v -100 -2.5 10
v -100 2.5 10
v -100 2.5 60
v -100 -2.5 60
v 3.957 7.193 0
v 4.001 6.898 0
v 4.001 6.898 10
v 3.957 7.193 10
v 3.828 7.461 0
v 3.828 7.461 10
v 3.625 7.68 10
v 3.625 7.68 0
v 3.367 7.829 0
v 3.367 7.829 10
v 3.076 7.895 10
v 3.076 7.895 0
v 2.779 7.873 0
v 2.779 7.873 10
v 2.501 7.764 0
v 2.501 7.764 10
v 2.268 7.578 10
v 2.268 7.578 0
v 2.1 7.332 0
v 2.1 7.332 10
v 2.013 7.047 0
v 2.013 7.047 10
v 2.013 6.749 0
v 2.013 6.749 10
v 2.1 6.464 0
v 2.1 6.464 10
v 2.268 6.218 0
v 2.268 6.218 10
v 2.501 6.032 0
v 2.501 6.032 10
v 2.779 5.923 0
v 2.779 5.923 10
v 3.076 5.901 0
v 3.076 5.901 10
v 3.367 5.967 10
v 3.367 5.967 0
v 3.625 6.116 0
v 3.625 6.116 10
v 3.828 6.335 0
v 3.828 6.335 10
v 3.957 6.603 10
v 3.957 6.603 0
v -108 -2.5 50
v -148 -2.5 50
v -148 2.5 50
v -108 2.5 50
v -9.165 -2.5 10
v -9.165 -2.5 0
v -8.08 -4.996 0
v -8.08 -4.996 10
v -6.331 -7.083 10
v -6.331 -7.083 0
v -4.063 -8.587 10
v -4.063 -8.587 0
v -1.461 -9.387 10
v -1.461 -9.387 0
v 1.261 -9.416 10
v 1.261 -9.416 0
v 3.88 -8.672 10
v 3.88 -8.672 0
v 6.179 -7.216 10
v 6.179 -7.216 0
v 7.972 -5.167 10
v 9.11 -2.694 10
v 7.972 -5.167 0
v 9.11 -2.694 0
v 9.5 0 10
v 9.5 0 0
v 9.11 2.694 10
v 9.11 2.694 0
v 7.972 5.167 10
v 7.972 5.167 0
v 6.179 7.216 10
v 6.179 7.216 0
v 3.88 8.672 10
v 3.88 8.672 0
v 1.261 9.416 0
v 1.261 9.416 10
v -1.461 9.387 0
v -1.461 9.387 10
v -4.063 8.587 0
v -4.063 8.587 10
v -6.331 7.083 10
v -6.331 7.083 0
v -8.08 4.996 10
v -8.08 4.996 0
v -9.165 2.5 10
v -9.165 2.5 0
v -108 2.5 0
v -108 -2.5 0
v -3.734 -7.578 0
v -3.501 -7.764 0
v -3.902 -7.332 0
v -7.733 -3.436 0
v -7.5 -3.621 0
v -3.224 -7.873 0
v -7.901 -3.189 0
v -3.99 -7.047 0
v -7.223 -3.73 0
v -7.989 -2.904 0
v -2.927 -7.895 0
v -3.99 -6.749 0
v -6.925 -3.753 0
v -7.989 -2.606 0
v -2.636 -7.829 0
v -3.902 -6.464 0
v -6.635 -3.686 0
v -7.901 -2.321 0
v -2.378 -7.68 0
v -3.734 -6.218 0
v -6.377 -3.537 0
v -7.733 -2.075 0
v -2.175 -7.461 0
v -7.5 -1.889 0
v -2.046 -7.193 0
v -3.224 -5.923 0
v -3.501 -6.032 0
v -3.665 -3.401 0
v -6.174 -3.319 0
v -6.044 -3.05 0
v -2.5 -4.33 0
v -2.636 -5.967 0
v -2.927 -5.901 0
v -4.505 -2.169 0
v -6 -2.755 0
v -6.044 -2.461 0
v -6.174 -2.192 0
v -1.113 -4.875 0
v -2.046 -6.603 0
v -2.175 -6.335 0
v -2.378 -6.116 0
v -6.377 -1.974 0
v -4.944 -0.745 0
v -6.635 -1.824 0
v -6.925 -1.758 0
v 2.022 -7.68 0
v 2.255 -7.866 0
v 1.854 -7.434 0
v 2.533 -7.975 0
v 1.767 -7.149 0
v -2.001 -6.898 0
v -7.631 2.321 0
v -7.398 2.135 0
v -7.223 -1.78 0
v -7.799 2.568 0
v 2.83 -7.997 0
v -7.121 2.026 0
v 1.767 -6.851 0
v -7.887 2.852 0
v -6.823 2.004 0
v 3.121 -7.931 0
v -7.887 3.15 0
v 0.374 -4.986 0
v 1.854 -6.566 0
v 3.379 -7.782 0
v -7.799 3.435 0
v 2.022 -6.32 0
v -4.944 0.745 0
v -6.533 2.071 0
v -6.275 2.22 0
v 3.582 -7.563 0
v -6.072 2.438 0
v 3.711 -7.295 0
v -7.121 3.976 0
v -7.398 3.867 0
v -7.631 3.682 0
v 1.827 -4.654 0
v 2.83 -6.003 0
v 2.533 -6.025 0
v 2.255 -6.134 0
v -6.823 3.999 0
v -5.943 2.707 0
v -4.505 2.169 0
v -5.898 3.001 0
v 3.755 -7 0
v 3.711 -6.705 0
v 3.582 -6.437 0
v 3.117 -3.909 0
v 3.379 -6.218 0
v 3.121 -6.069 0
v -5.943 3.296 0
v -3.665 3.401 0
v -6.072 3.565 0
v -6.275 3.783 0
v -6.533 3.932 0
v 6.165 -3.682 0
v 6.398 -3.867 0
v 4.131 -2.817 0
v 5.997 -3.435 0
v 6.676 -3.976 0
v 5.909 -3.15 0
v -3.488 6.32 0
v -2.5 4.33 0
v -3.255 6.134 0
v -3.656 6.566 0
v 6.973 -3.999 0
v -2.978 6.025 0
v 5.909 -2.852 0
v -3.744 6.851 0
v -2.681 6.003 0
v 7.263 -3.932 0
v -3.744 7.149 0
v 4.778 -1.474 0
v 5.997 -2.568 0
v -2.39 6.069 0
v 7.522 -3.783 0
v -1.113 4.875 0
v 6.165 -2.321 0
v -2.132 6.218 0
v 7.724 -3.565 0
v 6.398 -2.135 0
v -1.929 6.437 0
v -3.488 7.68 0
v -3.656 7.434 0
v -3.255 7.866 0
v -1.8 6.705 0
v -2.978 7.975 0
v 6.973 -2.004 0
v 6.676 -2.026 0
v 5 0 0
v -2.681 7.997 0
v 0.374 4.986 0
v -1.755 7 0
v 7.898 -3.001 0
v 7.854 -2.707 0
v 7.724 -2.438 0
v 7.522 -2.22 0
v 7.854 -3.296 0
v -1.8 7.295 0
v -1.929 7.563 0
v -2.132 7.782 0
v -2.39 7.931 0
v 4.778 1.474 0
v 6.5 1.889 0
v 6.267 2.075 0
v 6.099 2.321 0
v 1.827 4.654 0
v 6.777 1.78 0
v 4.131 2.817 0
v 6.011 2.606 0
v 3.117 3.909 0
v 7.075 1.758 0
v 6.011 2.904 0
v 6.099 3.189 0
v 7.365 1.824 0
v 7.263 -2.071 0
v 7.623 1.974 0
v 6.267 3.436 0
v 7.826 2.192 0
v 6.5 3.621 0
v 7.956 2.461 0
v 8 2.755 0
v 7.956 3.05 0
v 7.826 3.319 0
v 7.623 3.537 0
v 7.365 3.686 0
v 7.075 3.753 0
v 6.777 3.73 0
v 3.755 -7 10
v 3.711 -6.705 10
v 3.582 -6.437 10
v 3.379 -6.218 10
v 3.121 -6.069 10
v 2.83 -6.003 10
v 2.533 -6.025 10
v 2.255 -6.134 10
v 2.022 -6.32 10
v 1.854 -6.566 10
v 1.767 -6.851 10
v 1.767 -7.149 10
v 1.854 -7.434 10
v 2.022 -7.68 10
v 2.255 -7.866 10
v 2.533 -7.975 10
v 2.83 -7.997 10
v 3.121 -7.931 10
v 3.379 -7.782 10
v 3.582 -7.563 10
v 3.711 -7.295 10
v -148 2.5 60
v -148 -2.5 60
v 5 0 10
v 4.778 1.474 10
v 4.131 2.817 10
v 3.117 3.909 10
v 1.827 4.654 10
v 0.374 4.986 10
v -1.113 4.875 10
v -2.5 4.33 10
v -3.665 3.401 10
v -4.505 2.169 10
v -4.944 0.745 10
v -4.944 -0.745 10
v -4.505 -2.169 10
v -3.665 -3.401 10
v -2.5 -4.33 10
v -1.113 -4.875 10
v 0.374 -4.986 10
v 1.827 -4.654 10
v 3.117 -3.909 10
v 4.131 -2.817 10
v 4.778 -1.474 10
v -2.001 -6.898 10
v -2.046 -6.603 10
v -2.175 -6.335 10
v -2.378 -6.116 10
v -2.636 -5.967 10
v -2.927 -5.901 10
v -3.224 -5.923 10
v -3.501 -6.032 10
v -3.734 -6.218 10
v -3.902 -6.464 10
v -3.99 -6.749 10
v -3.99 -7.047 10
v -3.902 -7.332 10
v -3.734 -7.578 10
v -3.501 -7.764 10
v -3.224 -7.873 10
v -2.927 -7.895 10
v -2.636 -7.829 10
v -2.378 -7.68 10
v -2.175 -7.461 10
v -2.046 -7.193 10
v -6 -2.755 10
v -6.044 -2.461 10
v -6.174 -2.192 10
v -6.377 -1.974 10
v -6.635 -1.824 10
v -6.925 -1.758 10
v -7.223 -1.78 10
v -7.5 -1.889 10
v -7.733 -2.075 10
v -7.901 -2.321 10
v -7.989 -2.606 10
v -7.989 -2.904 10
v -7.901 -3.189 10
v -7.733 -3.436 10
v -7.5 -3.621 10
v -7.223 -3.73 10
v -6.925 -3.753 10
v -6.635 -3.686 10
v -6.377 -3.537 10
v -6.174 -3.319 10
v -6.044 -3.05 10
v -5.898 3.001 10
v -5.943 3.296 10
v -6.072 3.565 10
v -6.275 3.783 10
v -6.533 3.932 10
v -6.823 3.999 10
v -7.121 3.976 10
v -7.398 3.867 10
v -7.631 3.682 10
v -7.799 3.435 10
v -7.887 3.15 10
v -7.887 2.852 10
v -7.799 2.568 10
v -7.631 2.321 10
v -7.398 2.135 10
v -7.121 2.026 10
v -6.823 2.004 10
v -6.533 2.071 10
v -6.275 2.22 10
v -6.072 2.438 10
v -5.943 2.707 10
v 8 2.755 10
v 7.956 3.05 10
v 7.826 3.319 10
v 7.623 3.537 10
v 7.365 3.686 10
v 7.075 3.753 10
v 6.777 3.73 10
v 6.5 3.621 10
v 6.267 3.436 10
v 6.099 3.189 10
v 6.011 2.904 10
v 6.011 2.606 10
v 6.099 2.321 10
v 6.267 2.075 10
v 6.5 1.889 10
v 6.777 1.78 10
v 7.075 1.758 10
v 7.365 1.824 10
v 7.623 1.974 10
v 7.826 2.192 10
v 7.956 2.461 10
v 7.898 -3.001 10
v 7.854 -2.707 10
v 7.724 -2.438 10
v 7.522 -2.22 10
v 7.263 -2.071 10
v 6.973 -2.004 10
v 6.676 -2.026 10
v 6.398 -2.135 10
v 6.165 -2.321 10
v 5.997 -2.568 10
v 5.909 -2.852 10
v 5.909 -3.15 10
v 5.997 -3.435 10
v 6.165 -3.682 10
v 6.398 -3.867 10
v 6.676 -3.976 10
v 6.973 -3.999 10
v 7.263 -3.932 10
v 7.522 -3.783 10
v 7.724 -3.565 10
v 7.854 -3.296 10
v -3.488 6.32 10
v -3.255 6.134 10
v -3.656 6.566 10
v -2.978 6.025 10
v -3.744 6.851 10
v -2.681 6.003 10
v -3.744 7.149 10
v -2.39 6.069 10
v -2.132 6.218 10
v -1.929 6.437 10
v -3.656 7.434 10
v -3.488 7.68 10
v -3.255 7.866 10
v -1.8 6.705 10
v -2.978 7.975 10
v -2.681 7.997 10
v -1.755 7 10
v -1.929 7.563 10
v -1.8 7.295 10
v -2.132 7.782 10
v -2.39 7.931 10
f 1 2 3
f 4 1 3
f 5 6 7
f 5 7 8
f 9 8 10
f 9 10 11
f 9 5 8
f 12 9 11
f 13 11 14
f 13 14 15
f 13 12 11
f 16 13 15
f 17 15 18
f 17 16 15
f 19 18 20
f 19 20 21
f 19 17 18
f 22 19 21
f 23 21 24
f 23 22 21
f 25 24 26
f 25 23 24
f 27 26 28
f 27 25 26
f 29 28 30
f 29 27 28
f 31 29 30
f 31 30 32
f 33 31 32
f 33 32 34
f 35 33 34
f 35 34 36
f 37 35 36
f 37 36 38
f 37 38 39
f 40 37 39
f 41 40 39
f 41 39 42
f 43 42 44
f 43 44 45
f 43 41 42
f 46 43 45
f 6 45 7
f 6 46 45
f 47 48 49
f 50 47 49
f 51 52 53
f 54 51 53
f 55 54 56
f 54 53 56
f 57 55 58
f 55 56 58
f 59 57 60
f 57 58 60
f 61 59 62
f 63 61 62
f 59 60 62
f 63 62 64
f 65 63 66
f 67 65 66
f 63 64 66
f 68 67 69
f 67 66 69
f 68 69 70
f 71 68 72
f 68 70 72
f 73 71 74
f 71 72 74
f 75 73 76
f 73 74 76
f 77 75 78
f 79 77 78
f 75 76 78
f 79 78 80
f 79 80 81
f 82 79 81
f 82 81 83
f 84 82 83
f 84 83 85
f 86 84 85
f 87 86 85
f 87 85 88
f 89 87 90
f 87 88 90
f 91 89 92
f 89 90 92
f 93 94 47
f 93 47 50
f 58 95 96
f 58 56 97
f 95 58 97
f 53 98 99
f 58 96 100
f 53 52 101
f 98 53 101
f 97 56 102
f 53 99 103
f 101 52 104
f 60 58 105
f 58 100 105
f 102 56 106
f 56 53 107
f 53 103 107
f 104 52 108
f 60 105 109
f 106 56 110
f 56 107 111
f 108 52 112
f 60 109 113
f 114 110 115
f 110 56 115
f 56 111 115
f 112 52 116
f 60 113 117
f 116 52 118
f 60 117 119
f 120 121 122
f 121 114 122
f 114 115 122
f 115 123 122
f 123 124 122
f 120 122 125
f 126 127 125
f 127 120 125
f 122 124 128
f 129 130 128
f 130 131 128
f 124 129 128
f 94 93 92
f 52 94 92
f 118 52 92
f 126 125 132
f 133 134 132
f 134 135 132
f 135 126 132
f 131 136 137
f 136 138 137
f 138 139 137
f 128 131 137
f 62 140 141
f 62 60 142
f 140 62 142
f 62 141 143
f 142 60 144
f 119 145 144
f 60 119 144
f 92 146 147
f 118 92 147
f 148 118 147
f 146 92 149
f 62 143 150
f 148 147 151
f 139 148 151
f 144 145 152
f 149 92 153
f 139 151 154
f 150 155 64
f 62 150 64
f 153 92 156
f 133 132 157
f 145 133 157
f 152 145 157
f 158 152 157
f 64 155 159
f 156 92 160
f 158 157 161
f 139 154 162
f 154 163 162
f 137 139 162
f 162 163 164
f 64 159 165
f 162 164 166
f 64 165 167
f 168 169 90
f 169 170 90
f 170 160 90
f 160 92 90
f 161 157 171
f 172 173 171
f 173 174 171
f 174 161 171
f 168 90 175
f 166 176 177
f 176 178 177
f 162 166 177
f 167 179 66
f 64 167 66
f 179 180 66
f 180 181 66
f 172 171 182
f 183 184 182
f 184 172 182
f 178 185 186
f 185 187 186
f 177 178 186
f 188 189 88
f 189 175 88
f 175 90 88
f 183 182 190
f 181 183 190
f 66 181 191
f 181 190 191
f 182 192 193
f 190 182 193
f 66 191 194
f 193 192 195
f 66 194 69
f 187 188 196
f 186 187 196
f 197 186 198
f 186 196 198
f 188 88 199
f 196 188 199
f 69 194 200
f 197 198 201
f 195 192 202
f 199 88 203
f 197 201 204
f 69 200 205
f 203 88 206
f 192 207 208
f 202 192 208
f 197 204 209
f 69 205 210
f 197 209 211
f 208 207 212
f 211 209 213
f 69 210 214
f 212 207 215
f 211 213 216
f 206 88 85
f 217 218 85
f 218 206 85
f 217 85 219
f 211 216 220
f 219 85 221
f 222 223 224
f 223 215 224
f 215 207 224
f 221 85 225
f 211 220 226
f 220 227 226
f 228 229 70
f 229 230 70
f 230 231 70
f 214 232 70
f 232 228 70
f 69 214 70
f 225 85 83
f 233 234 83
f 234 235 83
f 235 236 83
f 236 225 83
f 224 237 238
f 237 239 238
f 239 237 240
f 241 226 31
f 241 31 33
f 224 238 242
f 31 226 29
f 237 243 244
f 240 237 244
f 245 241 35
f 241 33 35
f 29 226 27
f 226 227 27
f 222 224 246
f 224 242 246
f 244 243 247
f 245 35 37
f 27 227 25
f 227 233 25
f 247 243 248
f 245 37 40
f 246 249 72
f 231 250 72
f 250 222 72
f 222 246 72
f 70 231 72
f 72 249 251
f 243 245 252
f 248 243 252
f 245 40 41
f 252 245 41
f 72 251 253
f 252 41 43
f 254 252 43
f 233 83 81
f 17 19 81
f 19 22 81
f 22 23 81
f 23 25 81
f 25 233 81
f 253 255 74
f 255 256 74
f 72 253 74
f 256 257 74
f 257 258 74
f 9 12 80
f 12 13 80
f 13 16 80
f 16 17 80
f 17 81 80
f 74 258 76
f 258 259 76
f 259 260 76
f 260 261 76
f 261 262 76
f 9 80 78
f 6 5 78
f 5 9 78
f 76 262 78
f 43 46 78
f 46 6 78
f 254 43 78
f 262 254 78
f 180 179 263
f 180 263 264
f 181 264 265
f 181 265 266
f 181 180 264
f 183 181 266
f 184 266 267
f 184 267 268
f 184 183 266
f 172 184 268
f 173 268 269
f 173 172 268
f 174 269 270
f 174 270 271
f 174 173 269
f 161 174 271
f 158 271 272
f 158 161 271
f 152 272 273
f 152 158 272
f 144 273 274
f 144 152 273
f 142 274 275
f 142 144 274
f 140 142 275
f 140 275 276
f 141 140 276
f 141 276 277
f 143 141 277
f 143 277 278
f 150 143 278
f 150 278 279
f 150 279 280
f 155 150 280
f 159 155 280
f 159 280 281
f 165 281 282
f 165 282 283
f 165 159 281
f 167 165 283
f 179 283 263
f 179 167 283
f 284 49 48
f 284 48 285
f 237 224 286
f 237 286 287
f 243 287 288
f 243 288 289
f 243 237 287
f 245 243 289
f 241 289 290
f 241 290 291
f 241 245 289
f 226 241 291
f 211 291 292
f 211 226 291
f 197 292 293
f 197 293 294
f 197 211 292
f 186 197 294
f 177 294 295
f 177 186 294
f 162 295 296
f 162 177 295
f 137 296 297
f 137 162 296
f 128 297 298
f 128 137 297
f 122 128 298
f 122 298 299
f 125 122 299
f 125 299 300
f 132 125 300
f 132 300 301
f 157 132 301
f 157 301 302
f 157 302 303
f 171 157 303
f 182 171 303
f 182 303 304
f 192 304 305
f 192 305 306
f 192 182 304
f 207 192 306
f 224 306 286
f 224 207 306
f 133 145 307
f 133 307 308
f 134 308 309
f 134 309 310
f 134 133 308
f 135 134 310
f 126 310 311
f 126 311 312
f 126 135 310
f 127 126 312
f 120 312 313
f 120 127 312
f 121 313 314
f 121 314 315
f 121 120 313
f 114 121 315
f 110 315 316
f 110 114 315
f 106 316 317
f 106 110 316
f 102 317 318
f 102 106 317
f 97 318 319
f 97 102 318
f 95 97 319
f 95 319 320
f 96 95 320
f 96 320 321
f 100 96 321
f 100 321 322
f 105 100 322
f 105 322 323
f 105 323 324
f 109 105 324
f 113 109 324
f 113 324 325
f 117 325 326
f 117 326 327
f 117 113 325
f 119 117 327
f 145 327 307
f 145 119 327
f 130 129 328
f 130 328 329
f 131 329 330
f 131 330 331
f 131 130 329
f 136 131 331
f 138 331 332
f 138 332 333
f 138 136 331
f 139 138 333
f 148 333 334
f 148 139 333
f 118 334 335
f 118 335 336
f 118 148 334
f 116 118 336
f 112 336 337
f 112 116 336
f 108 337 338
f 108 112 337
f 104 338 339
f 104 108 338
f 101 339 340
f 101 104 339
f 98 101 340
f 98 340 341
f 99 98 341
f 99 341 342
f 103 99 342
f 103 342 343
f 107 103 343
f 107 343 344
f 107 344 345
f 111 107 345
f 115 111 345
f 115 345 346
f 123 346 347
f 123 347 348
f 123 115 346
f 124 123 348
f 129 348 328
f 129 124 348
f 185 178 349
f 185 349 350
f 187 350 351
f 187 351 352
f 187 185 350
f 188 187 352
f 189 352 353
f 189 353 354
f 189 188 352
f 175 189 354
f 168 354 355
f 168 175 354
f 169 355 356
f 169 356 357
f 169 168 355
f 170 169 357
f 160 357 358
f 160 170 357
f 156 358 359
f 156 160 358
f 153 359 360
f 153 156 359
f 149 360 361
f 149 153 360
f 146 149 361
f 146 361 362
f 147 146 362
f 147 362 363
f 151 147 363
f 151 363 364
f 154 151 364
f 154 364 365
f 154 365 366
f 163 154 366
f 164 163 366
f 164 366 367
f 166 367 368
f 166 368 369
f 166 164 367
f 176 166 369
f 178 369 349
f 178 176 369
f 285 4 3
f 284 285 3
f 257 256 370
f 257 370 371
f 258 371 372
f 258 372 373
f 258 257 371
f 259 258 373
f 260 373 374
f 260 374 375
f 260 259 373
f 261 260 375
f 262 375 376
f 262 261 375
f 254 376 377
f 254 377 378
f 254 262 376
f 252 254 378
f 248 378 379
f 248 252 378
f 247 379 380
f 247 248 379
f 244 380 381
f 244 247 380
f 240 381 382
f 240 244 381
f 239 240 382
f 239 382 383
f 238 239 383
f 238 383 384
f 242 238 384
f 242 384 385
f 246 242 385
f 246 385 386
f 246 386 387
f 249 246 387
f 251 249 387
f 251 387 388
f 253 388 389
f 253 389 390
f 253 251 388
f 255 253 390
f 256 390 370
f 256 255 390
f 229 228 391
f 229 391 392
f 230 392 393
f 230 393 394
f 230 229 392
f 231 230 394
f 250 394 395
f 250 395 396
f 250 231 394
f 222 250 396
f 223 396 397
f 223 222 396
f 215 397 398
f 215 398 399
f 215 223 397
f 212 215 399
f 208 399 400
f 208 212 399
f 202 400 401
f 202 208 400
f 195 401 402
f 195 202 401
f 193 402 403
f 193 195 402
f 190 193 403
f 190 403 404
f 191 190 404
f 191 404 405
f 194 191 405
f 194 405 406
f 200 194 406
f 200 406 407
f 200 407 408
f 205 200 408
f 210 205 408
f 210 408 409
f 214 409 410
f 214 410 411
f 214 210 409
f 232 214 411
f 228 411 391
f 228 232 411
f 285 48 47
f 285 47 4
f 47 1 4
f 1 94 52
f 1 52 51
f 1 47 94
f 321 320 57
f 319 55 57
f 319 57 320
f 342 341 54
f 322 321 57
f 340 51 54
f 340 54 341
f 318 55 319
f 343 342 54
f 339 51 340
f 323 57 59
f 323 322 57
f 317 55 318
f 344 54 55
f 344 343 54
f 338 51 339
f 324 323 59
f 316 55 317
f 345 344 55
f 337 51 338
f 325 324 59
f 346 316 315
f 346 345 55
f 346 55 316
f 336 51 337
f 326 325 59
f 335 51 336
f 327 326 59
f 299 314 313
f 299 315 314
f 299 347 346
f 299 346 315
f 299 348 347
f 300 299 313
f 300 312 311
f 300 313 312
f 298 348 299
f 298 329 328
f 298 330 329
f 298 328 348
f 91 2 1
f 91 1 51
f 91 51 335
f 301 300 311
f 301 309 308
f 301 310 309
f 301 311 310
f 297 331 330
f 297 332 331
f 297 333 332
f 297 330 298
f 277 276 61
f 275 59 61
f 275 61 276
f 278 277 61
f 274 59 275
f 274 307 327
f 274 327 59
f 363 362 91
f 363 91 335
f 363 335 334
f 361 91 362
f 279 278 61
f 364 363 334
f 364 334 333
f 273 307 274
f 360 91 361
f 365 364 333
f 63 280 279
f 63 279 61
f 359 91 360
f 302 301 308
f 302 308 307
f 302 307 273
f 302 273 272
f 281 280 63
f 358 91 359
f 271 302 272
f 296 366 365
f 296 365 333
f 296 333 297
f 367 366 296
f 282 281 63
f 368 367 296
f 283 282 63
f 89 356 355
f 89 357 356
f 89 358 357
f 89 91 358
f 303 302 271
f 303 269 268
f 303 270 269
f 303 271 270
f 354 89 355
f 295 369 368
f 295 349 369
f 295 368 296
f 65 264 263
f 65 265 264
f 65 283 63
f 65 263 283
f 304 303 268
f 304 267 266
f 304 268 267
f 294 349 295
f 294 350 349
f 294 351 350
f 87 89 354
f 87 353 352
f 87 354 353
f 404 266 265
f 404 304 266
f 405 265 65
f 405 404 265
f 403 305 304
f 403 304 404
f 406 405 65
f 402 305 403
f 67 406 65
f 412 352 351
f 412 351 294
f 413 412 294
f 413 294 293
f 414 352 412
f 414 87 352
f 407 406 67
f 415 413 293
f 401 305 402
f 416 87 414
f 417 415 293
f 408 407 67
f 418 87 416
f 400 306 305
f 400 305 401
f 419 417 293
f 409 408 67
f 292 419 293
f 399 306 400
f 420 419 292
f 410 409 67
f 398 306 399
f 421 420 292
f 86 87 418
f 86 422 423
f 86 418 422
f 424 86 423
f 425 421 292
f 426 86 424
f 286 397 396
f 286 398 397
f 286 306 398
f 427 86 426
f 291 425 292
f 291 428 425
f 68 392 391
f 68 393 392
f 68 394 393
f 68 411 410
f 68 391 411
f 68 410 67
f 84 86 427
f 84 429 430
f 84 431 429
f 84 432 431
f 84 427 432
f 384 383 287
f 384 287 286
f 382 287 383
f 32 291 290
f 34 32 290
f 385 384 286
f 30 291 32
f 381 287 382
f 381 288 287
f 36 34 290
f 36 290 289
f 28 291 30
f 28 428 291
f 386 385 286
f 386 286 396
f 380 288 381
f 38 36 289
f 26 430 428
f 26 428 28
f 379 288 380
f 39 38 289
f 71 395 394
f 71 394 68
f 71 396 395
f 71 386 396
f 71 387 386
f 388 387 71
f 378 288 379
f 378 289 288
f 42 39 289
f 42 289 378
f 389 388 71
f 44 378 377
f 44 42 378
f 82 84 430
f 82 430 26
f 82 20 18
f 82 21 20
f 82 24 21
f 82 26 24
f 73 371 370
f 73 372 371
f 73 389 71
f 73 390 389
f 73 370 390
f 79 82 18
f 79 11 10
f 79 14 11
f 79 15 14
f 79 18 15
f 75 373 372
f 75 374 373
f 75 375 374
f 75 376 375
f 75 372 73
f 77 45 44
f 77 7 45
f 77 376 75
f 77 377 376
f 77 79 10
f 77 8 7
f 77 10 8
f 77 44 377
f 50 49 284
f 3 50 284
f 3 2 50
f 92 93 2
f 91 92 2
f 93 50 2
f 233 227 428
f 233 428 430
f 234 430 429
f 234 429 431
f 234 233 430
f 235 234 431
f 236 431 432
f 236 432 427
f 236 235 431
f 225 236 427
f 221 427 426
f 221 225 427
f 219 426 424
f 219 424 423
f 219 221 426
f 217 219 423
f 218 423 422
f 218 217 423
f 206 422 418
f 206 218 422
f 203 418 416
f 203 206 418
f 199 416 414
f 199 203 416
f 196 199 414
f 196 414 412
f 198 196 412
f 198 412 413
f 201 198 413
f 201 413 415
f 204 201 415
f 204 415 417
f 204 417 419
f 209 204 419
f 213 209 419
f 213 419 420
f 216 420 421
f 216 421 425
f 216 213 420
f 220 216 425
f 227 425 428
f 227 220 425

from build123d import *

# Parameters (mm, degrees)
SKETCH1_R                = 5
SKETCH1_R_2              = 1
BOSS_EXTRUDE1_DEPTH      = 10
BOSS_EXTRUDE2_DEPTH      = 40
BOSS_EXTRUDE2_DEPTH_BACK = 10
SKETCH2_W                = 8
SKETCH2_H                = 5
BOSS_EXTRUDE3_DEPTH      = 40
BOSS_EXTRUDE3_DEPTH_BACK = 8
SKETCH3_W                = 10
SKETCH3_H                = 5


with BuildPart() as part:
    # Sketch1 → Boss-Extrude1 (new body)
    with BuildSketch(Plane.XY):
        with BuildLine():
            Line((-9.16515139, 2.5), (-100, 2.5))
            Line((-100, 2.5), (-100, -2.5))
            Line((-100, -2.5), (-9.16515139, -2.5))
            ThreePointArc((-9.16515139, -2.5), (9.5, 0), (-9.16515139, 2.5))
        make_face()
        Circle(SKETCH1_R, mode=Mode.SUBTRACT)
        with Locations((2.755362887, -7)):
            Circle(SKETCH1_R_2, mode=Mode.SUBTRACT)
        with Locations((-3.001411686, -6.89808325)):
            Circle(SKETCH1_R_2, mode=Mode.SUBTRACT)
        with Locations((-7, -2.755362887)):
            Circle(SKETCH1_R_2, mode=Mode.SUBTRACT)
        with Locations((-6.89808325, 3.001411686)):
            Circle(SKETCH1_R_2, mode=Mode.SUBTRACT)
        with Locations((-2.755362887, 7)):
            Circle(SKETCH1_R_2, mode=Mode.SUBTRACT)
        with Locations((3.001411686, 6.89808325)):
            Circle(SKETCH1_R_2, mode=Mode.SUBTRACT)
        with Locations((7, 2.755362887)):
            Circle(SKETCH1_R_2, mode=Mode.SUBTRACT)
        with Locations((6.89808325, -3.001411686)):
            Circle(SKETCH1_R_2, mode=Mode.SUBTRACT)
    extrude(amount=BOSS_EXTRUDE1_DEPTH)

    # Sketch2 → Boss-Extrude2 (add, two sides: drawn at the far end of the back side and taken through both)
    with BuildSketch(Plane.XY.offset(10).offset(-BOSS_EXTRUDE2_DEPTH_BACK)):
        with Locations((-104, 0)):
            Rectangle(SKETCH2_W, SKETCH2_H)
    extrude(amount=BOSS_EXTRUDE2_DEPTH + BOSS_EXTRUDE2_DEPTH_BACK)

    # Sketch3 → Boss-Extrude3 (add, two sides: drawn at the far end of the back side and taken through both)
    with BuildSketch(Plane.ZY.offset(108).offset(-BOSS_EXTRUDE3_DEPTH_BACK)):
        with Locations((55, 0)):
            Rectangle(SKETCH3_W, SKETCH3_H)
    extrude(amount=BOSS_EXTRUDE3_DEPTH + BOSS_EXTRUDE3_DEPTH_BACK)


solid = part.part
